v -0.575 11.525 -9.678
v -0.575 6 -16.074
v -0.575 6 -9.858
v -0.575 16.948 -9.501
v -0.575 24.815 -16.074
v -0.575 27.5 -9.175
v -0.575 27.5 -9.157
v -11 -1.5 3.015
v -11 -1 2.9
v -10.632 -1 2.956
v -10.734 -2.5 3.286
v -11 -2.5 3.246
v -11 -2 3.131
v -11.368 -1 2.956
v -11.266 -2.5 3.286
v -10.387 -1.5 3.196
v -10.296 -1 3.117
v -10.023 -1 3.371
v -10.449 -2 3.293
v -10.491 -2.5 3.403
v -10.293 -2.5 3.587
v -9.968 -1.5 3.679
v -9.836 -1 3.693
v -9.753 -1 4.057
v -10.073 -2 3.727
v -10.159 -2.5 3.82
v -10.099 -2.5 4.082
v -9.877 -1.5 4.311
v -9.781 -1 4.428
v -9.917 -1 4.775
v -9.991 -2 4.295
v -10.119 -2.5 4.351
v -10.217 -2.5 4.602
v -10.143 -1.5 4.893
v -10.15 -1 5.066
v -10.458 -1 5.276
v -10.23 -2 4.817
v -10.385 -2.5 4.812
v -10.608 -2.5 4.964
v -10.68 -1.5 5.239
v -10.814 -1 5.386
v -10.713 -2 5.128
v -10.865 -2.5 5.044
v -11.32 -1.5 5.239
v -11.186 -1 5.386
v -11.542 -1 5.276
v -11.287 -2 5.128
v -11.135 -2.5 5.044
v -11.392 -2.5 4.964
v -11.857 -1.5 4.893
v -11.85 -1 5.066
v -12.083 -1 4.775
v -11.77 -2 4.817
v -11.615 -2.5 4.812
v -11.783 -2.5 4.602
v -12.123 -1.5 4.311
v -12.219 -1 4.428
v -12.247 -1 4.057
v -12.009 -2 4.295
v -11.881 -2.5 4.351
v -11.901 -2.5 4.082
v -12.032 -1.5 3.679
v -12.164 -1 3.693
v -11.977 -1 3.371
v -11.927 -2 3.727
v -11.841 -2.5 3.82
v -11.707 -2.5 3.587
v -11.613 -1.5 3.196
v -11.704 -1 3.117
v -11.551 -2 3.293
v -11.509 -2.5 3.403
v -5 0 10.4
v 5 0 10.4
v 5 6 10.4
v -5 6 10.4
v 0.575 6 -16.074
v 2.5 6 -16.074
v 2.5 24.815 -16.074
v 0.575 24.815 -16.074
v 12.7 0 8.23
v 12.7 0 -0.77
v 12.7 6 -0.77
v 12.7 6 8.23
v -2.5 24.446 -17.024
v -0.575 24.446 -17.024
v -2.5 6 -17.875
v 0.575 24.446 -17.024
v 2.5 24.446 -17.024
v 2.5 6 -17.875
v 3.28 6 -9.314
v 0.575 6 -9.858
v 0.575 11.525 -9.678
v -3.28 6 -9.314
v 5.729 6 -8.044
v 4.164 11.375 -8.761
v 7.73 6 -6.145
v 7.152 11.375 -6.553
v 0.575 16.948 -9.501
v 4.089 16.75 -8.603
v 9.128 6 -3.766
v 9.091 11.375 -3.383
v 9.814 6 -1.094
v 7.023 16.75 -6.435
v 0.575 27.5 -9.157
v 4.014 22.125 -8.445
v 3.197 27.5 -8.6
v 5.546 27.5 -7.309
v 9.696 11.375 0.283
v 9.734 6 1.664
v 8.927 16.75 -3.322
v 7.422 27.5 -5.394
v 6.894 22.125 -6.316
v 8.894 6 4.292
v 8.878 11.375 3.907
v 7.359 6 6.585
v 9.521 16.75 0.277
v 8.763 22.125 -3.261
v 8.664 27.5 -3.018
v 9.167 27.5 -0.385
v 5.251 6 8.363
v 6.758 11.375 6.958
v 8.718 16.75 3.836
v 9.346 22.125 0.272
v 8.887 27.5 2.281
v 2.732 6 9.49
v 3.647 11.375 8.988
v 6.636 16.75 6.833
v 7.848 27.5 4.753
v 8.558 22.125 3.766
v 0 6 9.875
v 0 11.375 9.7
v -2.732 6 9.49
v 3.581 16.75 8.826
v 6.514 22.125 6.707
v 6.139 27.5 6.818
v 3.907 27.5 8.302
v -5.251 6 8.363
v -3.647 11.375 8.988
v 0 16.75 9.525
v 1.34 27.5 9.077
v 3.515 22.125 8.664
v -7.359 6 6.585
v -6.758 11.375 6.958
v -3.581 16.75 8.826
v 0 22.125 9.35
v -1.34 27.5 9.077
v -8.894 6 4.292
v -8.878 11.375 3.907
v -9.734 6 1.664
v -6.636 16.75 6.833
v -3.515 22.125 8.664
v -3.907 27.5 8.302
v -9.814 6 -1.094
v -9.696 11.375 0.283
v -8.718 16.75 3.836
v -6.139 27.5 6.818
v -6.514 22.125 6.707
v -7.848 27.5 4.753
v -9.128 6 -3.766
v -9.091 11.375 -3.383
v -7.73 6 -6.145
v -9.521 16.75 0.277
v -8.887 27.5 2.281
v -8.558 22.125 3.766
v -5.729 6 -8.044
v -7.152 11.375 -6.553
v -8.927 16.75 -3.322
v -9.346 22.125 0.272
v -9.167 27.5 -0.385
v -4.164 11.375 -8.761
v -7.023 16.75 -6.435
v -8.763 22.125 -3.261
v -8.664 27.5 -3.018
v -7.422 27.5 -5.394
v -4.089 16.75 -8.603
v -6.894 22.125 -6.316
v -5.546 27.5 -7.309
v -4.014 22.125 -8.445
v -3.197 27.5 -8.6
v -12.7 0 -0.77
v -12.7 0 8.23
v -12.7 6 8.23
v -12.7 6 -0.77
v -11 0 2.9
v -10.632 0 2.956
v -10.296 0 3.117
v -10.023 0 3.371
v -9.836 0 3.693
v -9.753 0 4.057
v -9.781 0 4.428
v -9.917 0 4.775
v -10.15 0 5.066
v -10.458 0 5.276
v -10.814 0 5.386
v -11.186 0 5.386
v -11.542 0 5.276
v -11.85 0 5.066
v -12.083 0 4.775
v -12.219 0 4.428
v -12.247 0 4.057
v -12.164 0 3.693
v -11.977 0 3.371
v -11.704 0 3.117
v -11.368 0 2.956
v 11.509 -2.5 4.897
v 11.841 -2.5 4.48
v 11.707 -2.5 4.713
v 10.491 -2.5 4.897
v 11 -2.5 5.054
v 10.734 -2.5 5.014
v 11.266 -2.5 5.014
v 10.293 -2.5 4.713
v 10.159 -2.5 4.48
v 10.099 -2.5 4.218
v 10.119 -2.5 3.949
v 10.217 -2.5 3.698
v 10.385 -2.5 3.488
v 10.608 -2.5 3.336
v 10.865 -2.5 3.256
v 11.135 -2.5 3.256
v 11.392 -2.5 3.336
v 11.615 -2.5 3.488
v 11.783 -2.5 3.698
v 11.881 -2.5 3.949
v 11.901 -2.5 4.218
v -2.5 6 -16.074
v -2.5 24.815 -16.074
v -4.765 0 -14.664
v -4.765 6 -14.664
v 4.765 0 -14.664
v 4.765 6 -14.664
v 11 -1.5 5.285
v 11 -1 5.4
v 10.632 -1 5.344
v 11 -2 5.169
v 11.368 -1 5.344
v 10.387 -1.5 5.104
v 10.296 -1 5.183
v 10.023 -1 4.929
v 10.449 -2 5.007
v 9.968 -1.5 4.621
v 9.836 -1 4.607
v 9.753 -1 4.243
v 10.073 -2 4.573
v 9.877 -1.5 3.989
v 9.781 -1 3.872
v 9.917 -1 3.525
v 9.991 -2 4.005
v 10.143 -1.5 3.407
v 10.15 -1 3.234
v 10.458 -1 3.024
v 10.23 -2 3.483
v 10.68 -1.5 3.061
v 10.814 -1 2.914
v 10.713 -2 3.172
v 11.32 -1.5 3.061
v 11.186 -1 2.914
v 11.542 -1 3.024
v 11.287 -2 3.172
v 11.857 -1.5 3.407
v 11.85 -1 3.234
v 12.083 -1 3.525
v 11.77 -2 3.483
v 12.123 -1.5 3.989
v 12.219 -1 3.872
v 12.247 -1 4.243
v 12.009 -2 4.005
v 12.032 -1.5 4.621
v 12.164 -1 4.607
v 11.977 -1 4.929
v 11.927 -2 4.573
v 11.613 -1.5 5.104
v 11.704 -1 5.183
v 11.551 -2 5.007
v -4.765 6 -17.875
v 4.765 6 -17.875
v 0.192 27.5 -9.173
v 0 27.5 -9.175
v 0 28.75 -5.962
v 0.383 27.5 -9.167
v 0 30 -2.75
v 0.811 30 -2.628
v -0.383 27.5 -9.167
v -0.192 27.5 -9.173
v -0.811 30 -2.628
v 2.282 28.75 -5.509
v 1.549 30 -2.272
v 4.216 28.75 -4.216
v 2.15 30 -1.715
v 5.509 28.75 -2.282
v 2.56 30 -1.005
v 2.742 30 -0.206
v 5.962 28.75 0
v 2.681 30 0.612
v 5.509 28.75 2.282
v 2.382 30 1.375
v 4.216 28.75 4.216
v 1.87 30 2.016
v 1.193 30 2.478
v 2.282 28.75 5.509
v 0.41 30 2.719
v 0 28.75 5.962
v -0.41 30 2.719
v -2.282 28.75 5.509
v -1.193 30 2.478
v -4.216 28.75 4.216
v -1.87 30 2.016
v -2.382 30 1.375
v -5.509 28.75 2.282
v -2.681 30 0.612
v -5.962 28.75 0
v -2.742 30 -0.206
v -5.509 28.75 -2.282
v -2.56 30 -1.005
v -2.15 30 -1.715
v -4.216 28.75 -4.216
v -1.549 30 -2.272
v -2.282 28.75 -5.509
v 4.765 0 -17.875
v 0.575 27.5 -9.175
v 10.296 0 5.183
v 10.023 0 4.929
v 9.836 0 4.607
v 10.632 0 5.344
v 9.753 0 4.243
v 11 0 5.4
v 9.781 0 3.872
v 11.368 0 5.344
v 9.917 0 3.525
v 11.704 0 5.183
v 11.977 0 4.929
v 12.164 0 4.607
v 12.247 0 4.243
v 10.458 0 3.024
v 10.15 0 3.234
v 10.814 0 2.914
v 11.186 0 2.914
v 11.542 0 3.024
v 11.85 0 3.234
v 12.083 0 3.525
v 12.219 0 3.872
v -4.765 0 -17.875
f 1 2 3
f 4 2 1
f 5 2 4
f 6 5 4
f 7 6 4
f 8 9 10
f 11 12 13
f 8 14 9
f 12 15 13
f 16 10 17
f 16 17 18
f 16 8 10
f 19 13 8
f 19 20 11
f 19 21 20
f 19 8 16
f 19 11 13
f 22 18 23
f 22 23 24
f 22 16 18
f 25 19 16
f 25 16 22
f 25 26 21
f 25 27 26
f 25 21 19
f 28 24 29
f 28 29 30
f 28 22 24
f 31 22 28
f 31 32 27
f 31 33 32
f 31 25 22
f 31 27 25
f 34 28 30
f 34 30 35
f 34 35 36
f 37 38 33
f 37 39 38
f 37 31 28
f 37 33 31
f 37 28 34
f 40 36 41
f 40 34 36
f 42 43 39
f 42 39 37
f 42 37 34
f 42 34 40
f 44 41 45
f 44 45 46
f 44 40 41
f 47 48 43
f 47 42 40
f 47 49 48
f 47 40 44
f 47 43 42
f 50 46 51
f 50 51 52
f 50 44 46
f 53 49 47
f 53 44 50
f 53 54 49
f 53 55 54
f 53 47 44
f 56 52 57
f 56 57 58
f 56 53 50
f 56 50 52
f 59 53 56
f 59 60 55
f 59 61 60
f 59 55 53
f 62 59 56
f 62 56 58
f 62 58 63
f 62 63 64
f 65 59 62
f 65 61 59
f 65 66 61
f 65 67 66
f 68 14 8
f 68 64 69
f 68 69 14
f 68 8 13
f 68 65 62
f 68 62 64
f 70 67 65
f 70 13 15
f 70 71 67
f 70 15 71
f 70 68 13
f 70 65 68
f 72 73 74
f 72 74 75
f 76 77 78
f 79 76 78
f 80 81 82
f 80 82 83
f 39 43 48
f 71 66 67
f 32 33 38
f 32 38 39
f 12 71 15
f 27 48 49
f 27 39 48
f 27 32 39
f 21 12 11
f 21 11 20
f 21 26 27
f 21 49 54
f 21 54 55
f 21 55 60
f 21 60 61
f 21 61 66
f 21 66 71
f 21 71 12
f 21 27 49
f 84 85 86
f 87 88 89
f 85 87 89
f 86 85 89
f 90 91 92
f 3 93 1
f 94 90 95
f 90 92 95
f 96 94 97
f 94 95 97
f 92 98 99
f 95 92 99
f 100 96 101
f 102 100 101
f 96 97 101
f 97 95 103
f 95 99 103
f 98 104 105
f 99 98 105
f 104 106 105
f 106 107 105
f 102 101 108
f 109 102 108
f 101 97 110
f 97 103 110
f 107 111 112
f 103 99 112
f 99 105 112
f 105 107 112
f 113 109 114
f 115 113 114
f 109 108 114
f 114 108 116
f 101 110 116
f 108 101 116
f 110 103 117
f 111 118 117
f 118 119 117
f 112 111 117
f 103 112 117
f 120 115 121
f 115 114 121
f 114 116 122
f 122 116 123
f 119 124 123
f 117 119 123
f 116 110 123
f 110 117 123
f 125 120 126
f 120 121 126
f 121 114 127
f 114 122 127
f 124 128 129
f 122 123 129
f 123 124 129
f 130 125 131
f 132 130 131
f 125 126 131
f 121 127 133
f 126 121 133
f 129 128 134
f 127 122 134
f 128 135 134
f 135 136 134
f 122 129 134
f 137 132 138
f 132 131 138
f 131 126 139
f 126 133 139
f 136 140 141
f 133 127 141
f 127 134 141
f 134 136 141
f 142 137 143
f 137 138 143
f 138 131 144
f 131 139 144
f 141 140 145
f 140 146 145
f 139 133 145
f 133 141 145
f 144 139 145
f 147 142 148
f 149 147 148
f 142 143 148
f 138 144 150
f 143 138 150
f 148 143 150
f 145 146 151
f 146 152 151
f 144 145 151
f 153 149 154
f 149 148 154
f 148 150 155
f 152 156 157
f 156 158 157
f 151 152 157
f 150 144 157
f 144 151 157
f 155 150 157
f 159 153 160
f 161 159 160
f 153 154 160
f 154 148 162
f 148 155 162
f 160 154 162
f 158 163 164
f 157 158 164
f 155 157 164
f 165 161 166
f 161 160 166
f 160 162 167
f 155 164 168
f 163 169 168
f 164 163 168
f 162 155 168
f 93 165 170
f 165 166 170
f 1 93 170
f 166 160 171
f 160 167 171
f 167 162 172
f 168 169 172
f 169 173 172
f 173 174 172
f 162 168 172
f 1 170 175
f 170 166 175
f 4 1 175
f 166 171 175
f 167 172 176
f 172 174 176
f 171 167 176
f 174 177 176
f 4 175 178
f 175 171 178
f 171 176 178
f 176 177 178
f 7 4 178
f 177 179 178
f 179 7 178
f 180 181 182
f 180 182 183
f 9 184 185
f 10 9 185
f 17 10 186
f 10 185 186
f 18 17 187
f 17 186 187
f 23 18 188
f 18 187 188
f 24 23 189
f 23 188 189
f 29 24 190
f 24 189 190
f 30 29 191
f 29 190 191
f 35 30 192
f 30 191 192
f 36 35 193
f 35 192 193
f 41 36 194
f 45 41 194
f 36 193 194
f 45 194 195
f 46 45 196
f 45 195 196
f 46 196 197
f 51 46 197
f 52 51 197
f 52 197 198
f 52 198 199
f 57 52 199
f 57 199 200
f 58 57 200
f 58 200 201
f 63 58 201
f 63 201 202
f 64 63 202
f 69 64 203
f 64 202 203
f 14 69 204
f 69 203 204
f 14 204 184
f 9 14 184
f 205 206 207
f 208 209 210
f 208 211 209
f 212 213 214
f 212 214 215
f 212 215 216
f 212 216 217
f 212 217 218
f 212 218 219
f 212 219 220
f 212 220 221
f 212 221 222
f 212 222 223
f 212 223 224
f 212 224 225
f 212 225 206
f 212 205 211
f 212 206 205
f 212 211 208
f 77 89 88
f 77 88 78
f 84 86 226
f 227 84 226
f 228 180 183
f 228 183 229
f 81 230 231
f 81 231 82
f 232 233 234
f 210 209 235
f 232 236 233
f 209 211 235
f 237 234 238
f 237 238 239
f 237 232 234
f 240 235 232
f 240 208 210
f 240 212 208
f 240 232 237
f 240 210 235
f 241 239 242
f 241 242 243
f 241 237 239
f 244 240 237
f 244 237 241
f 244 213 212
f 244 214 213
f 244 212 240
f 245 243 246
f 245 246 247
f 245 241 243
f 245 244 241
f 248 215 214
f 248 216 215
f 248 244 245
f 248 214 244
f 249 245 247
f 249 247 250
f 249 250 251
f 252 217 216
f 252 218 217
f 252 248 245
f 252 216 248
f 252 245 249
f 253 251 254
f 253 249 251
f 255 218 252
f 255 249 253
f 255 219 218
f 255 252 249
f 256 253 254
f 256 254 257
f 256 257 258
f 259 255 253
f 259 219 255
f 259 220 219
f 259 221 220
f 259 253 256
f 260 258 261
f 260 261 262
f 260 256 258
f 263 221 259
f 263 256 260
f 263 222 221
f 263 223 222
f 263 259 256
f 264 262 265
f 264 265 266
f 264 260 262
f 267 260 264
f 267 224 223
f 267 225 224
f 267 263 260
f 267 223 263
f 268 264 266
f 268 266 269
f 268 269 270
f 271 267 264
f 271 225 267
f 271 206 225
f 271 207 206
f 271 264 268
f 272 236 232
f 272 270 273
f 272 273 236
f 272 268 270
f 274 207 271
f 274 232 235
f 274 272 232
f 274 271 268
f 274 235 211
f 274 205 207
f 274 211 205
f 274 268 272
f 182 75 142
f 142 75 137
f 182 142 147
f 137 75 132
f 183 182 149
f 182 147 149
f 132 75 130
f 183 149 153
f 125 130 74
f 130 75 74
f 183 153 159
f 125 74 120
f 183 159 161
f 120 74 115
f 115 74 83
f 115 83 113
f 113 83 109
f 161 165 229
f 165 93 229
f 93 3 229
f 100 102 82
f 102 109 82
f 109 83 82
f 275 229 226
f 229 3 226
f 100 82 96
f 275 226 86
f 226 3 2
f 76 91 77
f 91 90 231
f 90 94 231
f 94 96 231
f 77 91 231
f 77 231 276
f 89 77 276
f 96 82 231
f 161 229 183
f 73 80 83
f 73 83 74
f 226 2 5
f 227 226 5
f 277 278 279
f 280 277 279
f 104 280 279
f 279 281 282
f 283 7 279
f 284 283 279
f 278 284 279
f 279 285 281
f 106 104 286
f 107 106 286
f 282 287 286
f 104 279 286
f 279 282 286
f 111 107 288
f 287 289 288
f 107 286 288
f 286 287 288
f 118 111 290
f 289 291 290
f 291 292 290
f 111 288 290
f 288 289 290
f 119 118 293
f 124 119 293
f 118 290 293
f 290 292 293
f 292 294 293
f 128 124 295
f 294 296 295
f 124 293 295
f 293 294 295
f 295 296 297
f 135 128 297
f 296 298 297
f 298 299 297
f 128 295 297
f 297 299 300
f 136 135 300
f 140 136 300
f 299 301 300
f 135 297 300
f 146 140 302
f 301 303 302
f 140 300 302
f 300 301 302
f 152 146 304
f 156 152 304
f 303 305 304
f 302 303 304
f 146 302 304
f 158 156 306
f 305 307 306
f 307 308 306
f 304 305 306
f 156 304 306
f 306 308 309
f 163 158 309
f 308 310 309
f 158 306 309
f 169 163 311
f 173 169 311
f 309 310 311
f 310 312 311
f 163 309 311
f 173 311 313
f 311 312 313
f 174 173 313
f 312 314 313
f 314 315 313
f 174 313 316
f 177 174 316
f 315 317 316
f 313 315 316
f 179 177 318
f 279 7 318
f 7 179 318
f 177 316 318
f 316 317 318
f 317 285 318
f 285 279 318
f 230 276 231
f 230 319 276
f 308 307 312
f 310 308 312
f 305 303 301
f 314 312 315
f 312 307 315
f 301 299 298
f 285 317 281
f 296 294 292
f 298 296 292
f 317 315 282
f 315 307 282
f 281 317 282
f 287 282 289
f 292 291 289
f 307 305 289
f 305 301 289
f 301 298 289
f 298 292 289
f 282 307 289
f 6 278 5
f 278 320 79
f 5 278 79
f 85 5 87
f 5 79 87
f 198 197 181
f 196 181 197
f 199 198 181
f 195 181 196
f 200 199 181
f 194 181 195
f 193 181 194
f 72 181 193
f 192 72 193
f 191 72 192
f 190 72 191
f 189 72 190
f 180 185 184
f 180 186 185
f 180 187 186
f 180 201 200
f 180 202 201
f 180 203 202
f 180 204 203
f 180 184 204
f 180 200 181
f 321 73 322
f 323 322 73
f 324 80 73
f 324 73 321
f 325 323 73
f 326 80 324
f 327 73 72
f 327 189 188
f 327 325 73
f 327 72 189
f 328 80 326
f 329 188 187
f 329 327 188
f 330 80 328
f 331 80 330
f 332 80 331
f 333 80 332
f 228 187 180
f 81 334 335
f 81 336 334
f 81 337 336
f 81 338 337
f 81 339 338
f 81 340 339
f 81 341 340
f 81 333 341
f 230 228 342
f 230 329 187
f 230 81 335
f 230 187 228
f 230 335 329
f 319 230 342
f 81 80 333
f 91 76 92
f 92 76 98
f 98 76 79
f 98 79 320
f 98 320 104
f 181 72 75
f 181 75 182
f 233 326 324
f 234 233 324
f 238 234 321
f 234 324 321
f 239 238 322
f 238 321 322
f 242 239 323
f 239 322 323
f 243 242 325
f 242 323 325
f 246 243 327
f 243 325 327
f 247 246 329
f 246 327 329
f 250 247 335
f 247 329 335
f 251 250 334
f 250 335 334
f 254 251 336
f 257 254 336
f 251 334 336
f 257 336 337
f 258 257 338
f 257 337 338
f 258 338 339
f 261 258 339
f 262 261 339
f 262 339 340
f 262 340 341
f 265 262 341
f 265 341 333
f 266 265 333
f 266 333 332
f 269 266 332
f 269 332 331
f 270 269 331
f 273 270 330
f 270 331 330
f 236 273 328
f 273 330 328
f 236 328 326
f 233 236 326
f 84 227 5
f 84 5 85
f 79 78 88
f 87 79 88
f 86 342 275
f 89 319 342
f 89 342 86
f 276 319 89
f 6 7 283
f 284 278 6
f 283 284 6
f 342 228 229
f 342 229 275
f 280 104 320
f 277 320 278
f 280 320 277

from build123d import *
from OCP.BRepFilletAPI import BRepFilletAPI_MakeChamfer

# Parameters (mm, degrees)
BOSS_EXTRU_1_DEPTH             = 6
BOSS_EXTRU_5_DEPTH             = 0.575
BOSS_EXTRU_6_REACH             = 39.159
ESQUISSE4_W                    = 0.275
ESQUISSE4_H                    = 6
BOSS_EXTRU_6_DIRECTION_2_REACH = 39.159
BOSS_EXTRU_7_DEPTH             = 2.5
ESQUISSE6_R                    = 1.25
BOSS_EXTRU_8_DEPTH             = 2.5
CHANFREIN1_SIZE                = 1.5
CHANFREIN1_SIZE2               = 0.346302287


with BuildPart() as part:
    # Esquisse1 → Boss.-Extru.1 (new body)
    with BuildSketch(Plane(origin=(0, 0, 0), x_dir=(1, 0, 0), z_dir=(0, 1, 0))):
        Polygon((5, -10.4), (-5, -10.4), (-12.7, -8.229746559), (-12.7, 0.770253441), (-4.765, 14.663984942), (-4.765, 17.6), (4.765, 17.6), (4.765, 14.663984942), (12.7, 0.770253441), (12.7, -8.229746559), align=None)
    extrude(amount=BOSS_EXTRU_1_DEPTH)

    # Esquisse2 → Révolution1 (revolve)
    with BuildSketch(Plane(origin=(0, 0, 0), x_dir=(0, 0, -1), z_dir=(1, 0, 0)), mode=Mode.PRIVATE) as r_volution1_sk:
        Polygon((0, 6), (-9.875, 6), (-9.175, 27.5), (-2.75, 30), (0, 30), align=None)
    revolve(r_volution1_sk.sketch.rotate(Axis((0, 30, 0), (0, -1, 0)), 180), axis=Axis((0, 30, 0), (0, -1, 0)))

    # Esquisse3 → Boss.-Extru.5 (add, symmetric)
    with BuildSketch(Plane(origin=(0, 0, 0), x_dir=(0, 0, -1), z_dir=(1, 0, 0))):
        Polygon((9.175, 27.5), (17.024440931, 24.445742828), (17.875, 6), (9.875, 6), (8.375, 6), (8.375, 27.5), align=None)
    extrude(amount=BOSS_EXTRU_5_DEPTH, both=True)

    # Boss.-Extru.6: up to this face of the body (flat: up to its plane)
    boss_extru_6_end = Plane(part.part.faces().sort_by_distance((4.765, 3, -16.131992471))[0])
    # Esquisse4 → Boss.-Extru.6 (add, up to the picked face)
    with BuildSketch(Plane(origin=(0, 0, 0), x_dir=(0, 0, -1), z_dir=(1, 0, 0)), mode=Mode.PRIVATE) as boss_extru_6_sk1:
        with Locations((17.7375, 3)):
            Rectangle(ESQUISSE4_W, ESQUISSE4_H)
    boss_extru_6_tool1 = split(extrude(boss_extru_6_sk1.sketch, amount=BOSS_EXTRU_6_REACH, mode=Mode.PRIVATE), bisect_by=boss_extru_6_end, keep=Keep.BOTH, mode=Mode.PRIVATE)
    add(boss_extru_6_tool1.solids().sort_by(Axis((0, 3, -17.7375), (1, 0, 0)))[0])

    # Boss.-Extru.6 direction 2: up to this face of the body (flat: up to its plane)
    boss_extru_6_direction_2_end = Plane(part.part.faces().sort_by_distance((-4.765, 3, -16.131992471))[0])
    # Esquisse4 → Boss.-Extru.6 direction 2 (add, up to the picked face)
    with BuildSketch(Plane(origin=(0, 0, 0), x_dir=(0, 0, -1), z_dir=(1, 0, 0)), mode=Mode.PRIVATE) as boss_extru_6_direction_2_sk1:
        with Locations((17.7375, 3)):
            Rectangle(ESQUISSE4_W, ESQUISSE4_H)
    boss_extru_6_direction_2_tool1 = split(extrude(boss_extru_6_direction_2_sk1.sketch, amount=-BOSS_EXTRU_6_DIRECTION_2_REACH, mode=Mode.PRIVATE), bisect_by=boss_extru_6_direction_2_end, keep=Keep.BOTH, mode=Mode.PRIVATE)
    add(boss_extru_6_direction_2_tool1.solids().sort_by(Axis((0, 3, -17.7375), (-1, 0, 0)))[0])

    # Esquisse5 → Boss.-Extru.7 (add, symmetric)
    with BuildSketch(Plane(origin=(0, 0, 0), x_dir=(0, 0, -1), z_dir=(1, 0, 0))):
        Polygon((16.074440931, 24.815392634), (17.024440931, 24.445742828), (17.875, 6), (16.074440931, 6), align=None)
    extrude(amount=BOSS_EXTRU_7_DEPTH, both=True)

    # Esquisse6 → Boss.-Extru.8 (add)
    with BuildSketch(Plane.XZ):
        with Locations(Location((-11, 4.15, 0), (0, 0, 270))):
            Circle(ESQUISSE6_R)
        with Locations(Location((11, 4.15, 0), (0, 0, 90))):
            Circle(ESQUISSE6_R)
    extrude(amount=BOSS_EXTRU_8_DEPTH)

    # Chanfrein1: one chamfer whose edges measure the first distance from different faces: ONE call of the kernel's chamfer builder (chamfer() names one face for all edges)
    chanfrein1_edges_1 = [part.edges().sort_by_distance(p)[0] for p in [
        (-11, -2.5, 5.4),
    ]]
    chanfrein1_side_1 = [part.faces().sort_by_distance(p)[0] for p in [
        (-11, -1.25, 5.4),
    ]]
    chanfrein1_edges_2 = [part.edges().sort_by_distance(p)[0] for p in [
        (11, -2.5, 2.9),
    ]]
    chanfrein1_side_2 = [part.faces().sort_by_distance(p)[0] for p in [
        (11, -1.25, 2.9),
    ]]
    chanfrein1 = BRepFilletAPI_MakeChamfer(part.part.solid().wrapped)
    for e in chanfrein1_edges_1:
        chanfrein1.Add(CHANFREIN1_SIZE, CHANFREIN1_SIZE2, e.wrapped, chanfrein1_side_1[0].wrapped)  # the first distance lies on this face
    for e in chanfrein1_edges_2:
        chanfrein1.Add(CHANFREIN1_SIZE, CHANFREIN1_SIZE2, e.wrapped, chanfrein1_side_2[0].wrapped)  # the first distance lies on this face
    add(Compound.cast(chanfrein1.Shape()), mode=Mode.REPLACE)


solid = part.part
